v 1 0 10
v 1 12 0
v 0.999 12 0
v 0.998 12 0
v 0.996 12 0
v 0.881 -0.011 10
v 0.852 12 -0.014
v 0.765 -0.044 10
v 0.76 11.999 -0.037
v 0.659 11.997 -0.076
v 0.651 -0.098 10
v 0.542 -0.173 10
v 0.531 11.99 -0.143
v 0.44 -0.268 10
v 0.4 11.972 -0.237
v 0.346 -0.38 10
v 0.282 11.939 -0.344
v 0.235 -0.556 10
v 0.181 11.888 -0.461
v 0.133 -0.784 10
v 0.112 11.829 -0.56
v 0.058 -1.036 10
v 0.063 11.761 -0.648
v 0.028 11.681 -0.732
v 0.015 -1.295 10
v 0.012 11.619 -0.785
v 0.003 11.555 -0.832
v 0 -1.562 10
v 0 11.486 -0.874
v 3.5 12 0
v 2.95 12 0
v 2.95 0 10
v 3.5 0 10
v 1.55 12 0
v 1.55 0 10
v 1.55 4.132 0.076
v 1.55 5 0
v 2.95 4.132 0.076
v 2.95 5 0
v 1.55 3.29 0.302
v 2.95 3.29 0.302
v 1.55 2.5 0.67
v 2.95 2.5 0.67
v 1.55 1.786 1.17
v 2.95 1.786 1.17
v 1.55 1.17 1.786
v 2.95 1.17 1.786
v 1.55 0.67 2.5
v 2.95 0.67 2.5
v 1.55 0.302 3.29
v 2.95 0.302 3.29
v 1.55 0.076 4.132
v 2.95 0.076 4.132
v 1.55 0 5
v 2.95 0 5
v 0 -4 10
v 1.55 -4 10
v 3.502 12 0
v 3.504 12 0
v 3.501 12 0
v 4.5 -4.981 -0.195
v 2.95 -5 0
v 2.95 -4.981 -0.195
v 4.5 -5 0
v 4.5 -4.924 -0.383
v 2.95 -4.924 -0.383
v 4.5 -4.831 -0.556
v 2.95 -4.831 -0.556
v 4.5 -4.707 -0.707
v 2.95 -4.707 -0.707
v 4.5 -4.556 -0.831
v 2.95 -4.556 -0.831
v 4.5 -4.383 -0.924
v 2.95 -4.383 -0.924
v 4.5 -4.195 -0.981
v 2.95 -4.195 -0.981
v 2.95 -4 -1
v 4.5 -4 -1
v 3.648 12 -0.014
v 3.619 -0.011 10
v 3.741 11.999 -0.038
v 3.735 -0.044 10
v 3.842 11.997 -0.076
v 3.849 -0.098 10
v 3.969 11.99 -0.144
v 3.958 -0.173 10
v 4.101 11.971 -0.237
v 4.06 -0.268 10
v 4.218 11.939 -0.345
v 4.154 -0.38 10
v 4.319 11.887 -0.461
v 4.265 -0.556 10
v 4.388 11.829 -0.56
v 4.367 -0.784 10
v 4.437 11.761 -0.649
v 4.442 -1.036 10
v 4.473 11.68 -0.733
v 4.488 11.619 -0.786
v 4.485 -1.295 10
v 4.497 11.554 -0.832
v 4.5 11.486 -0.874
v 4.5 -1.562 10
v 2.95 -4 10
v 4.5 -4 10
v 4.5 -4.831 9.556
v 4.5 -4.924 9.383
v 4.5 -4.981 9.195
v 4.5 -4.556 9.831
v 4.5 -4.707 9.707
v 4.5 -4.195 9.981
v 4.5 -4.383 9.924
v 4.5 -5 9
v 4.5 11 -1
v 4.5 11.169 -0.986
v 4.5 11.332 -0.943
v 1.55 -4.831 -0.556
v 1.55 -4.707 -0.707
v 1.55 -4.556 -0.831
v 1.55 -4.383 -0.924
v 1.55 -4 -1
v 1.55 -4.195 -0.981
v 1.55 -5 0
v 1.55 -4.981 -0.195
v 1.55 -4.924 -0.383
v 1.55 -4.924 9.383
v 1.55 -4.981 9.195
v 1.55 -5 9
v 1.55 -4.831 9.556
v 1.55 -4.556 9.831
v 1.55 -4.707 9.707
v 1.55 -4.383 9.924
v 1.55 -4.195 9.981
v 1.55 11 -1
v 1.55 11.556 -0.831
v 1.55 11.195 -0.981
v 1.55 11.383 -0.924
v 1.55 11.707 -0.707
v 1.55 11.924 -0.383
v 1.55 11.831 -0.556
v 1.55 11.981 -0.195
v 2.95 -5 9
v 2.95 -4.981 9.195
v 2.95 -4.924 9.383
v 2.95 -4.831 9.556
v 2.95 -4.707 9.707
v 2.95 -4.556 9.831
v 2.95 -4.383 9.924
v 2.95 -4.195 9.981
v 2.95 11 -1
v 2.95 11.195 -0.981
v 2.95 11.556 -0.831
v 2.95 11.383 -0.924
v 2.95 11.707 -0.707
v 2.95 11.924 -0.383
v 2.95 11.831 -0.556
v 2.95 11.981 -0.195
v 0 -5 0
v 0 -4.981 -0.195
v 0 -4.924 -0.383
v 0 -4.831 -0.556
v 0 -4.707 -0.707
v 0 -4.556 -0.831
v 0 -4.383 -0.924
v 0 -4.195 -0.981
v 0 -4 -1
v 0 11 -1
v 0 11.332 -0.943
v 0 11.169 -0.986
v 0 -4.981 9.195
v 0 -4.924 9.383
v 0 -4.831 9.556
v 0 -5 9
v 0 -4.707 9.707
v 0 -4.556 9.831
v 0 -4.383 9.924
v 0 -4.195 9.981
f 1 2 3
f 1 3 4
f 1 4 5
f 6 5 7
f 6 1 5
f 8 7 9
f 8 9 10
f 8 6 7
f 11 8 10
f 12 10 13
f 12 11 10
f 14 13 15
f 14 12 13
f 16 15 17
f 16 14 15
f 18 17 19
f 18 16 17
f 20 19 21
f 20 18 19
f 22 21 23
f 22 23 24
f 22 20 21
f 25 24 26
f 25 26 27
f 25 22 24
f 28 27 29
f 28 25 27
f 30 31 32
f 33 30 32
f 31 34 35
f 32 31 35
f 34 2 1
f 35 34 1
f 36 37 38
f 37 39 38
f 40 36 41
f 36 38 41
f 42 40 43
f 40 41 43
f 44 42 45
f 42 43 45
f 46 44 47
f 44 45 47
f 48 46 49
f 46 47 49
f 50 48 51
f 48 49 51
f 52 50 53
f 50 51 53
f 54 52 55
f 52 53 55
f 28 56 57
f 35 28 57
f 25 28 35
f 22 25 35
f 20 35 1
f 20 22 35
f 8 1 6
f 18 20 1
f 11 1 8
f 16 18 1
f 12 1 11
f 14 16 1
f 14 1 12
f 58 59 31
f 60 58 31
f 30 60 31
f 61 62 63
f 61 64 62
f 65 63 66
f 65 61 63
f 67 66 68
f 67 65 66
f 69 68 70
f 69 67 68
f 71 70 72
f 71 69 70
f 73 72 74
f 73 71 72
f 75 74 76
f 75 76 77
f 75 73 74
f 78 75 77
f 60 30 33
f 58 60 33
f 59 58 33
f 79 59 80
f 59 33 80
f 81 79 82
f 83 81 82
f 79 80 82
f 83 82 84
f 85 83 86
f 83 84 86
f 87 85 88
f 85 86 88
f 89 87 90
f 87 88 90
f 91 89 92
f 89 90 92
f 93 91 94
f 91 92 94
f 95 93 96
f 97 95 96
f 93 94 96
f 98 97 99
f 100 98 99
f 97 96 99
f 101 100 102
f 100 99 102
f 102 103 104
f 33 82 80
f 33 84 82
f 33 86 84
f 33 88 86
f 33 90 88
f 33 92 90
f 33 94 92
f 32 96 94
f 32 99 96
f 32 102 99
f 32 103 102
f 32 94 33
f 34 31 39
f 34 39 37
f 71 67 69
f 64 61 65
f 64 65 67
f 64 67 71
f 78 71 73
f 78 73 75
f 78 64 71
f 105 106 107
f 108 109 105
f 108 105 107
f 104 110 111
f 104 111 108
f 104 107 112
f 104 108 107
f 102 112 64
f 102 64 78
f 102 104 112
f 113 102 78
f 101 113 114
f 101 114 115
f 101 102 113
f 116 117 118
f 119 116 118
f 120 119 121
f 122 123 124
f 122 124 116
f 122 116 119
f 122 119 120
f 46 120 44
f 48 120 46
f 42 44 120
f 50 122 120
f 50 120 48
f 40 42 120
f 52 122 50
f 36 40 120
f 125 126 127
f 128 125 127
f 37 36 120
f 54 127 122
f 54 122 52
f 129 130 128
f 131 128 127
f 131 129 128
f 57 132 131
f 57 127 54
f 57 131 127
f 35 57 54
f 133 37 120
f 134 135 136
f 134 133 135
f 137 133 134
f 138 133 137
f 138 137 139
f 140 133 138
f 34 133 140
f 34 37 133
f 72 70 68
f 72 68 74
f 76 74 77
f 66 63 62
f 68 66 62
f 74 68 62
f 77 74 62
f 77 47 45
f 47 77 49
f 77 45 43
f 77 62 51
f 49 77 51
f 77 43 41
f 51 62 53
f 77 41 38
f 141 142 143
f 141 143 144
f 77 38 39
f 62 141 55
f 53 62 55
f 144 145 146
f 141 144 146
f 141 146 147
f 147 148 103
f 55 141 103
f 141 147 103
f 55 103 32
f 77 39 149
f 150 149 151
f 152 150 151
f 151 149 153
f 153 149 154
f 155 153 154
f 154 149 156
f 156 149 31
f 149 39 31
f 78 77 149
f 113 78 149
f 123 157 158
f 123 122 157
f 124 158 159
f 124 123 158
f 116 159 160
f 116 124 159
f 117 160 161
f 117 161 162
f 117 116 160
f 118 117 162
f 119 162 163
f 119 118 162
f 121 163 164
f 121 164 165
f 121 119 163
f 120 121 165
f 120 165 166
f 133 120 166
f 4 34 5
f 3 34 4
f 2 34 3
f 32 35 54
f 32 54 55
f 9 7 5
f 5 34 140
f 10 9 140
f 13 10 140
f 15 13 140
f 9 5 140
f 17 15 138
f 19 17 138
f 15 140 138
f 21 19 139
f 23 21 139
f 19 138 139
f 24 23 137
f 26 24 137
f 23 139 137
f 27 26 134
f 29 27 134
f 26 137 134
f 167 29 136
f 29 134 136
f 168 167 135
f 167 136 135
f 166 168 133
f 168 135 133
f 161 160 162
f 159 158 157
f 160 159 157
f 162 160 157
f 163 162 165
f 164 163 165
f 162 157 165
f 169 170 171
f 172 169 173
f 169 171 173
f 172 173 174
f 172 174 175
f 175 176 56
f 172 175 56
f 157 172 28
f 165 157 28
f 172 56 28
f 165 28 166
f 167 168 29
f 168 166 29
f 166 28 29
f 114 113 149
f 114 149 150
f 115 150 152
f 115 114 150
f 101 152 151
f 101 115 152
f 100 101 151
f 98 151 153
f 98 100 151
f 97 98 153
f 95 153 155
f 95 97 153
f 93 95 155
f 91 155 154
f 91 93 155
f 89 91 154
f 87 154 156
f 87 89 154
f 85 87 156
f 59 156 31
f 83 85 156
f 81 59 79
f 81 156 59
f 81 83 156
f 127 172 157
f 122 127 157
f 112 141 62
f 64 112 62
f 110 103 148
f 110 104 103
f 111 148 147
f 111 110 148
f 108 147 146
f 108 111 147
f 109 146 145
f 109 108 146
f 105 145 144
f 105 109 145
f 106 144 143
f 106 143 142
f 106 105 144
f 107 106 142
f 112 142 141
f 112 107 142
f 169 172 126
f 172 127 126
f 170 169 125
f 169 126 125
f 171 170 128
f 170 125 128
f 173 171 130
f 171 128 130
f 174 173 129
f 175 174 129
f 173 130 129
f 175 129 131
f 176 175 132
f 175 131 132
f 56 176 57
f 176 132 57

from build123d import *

# Parameters (mm, degrees)
F0_W     = 5
F0_H     = 10
F1_DEPTH = 4.5
F2_W     = 1.4
F2_H     = 5
F3_DEPTH = 25
F4_W     = 1.4
F4_H     = 1
F5_DEPTH = 25
F6_R     = 0.99999
F6_R_2   = 1
F7_R     = 5


# Not quite as in the source:
# - a fillet or chamfer is up to 0.001 mm smaller than in the source, because OpenCascade refuses the exact size


with BuildPart() as f1:
    # F0 (on Right) → F1 (new body)
    with BuildSketch(Plane.YZ):
        with Locations((-2.5, 5)):
            Rectangle(F0_W, F0_H)
        Polygon((0, 10), (0, 0), (12, 0), align=None)
        Polygon((12, 0), (0, 0), (-5, 0), (-5, -1), (12, -1), align=None)
    extrude(amount=F1_DEPTH)

    # F2 (on face) → F3 (cut)
    with BuildSketch(Plane.XY.offset(10)):
        with Locations((2.25, -2.5)):
            Rectangle(F2_W, F2_H)
    extrude(amount=-F3_DEPTH, mode=Mode.SUBTRACT)

    # F4 (on face) → F5 (cut)
    with BuildSketch(Plane(origin=(0, 12, 0), x_dir=(-1, 0, 0), z_dir=(0, 1, 0))):
        with Locations((-2.25, -0.5)):
            Rectangle(F4_W, F4_H)
    extrude(amount=-F5_DEPTH, mode=Mode.SUBTRACT)

    # F6 (call 1 of 8: OpenCascade refuses the feature's edges together) (radius 1 in the source; OpenCascade refuses exactly that, so slightly less here)
    f6_edges = [f1.edges().sort_by_distance(p)[0] for p in [
        (3.725, 12, -1),
    ]]
    fillet(f6_edges, radius=F6_R)

    # F6#2 (call 2 of 8) (radius 1 in the source; OpenCascade refuses exactly that, so slightly less here)
    f6_2_edges = [f1.edges().sort_by_distance(p)[0] for p in [
        (0.775, 12, -1),
    ]]
    fillet(f6_2_edges, radius=F6_R)

    # F6#3 (call 3 of 8)
    f6_3_edges = [f1.edges().sort_by_distance(p)[0] for p in [
        (3.725, -5, -1),
    ]]
    fillet(f6_3_edges, radius=F6_R_2)

    # F6#4 (call 4 of 8)
    f6_4_edges = [f1.edges().sort_by_distance(p)[0] for p in [
        (0.775, -5, -1),
    ]]
    fillet(f6_4_edges, radius=F6_R_2)

    # F6#5 (call 5 of 8)
    f6_5_edges = [f1.edges().sort_by_distance(p)[0] for p in [
        (0.775, -5, 10),
    ]]
    fillet(f6_5_edges, radius=F6_R_2)

    # F6#6 (call 6 of 8)
    f6_6_edges = [f1.edges().sort_by_distance(p)[0] for p in [
        (3.725, -5, 10),
    ]]
    fillet(f6_6_edges, radius=F6_R_2)

    # F6#7 (call 7 of 8)
    f6_7_edges = [f1.edges().sort_by_distance(p)[0] for p in [
        (0, 6, 5),
    ]]
    fillet(f6_7_edges, radius=F6_R_2)

    # F6#8 (call 8 of 8)
    f6_8_edges = [f1.edges().sort_by_distance(p)[0] for p in [
        (4.5, 6, 5),
    ]]
    fillet(f6_8_edges, radius=F6_R_2)

    # F7
    f7_edges = [f1.edges().sort_by_distance(p)[0] for p in [
        (2.25, 0, 0),
    ]]
    fillet(f7_edges, radius=F7_R)


solid = f1.part
